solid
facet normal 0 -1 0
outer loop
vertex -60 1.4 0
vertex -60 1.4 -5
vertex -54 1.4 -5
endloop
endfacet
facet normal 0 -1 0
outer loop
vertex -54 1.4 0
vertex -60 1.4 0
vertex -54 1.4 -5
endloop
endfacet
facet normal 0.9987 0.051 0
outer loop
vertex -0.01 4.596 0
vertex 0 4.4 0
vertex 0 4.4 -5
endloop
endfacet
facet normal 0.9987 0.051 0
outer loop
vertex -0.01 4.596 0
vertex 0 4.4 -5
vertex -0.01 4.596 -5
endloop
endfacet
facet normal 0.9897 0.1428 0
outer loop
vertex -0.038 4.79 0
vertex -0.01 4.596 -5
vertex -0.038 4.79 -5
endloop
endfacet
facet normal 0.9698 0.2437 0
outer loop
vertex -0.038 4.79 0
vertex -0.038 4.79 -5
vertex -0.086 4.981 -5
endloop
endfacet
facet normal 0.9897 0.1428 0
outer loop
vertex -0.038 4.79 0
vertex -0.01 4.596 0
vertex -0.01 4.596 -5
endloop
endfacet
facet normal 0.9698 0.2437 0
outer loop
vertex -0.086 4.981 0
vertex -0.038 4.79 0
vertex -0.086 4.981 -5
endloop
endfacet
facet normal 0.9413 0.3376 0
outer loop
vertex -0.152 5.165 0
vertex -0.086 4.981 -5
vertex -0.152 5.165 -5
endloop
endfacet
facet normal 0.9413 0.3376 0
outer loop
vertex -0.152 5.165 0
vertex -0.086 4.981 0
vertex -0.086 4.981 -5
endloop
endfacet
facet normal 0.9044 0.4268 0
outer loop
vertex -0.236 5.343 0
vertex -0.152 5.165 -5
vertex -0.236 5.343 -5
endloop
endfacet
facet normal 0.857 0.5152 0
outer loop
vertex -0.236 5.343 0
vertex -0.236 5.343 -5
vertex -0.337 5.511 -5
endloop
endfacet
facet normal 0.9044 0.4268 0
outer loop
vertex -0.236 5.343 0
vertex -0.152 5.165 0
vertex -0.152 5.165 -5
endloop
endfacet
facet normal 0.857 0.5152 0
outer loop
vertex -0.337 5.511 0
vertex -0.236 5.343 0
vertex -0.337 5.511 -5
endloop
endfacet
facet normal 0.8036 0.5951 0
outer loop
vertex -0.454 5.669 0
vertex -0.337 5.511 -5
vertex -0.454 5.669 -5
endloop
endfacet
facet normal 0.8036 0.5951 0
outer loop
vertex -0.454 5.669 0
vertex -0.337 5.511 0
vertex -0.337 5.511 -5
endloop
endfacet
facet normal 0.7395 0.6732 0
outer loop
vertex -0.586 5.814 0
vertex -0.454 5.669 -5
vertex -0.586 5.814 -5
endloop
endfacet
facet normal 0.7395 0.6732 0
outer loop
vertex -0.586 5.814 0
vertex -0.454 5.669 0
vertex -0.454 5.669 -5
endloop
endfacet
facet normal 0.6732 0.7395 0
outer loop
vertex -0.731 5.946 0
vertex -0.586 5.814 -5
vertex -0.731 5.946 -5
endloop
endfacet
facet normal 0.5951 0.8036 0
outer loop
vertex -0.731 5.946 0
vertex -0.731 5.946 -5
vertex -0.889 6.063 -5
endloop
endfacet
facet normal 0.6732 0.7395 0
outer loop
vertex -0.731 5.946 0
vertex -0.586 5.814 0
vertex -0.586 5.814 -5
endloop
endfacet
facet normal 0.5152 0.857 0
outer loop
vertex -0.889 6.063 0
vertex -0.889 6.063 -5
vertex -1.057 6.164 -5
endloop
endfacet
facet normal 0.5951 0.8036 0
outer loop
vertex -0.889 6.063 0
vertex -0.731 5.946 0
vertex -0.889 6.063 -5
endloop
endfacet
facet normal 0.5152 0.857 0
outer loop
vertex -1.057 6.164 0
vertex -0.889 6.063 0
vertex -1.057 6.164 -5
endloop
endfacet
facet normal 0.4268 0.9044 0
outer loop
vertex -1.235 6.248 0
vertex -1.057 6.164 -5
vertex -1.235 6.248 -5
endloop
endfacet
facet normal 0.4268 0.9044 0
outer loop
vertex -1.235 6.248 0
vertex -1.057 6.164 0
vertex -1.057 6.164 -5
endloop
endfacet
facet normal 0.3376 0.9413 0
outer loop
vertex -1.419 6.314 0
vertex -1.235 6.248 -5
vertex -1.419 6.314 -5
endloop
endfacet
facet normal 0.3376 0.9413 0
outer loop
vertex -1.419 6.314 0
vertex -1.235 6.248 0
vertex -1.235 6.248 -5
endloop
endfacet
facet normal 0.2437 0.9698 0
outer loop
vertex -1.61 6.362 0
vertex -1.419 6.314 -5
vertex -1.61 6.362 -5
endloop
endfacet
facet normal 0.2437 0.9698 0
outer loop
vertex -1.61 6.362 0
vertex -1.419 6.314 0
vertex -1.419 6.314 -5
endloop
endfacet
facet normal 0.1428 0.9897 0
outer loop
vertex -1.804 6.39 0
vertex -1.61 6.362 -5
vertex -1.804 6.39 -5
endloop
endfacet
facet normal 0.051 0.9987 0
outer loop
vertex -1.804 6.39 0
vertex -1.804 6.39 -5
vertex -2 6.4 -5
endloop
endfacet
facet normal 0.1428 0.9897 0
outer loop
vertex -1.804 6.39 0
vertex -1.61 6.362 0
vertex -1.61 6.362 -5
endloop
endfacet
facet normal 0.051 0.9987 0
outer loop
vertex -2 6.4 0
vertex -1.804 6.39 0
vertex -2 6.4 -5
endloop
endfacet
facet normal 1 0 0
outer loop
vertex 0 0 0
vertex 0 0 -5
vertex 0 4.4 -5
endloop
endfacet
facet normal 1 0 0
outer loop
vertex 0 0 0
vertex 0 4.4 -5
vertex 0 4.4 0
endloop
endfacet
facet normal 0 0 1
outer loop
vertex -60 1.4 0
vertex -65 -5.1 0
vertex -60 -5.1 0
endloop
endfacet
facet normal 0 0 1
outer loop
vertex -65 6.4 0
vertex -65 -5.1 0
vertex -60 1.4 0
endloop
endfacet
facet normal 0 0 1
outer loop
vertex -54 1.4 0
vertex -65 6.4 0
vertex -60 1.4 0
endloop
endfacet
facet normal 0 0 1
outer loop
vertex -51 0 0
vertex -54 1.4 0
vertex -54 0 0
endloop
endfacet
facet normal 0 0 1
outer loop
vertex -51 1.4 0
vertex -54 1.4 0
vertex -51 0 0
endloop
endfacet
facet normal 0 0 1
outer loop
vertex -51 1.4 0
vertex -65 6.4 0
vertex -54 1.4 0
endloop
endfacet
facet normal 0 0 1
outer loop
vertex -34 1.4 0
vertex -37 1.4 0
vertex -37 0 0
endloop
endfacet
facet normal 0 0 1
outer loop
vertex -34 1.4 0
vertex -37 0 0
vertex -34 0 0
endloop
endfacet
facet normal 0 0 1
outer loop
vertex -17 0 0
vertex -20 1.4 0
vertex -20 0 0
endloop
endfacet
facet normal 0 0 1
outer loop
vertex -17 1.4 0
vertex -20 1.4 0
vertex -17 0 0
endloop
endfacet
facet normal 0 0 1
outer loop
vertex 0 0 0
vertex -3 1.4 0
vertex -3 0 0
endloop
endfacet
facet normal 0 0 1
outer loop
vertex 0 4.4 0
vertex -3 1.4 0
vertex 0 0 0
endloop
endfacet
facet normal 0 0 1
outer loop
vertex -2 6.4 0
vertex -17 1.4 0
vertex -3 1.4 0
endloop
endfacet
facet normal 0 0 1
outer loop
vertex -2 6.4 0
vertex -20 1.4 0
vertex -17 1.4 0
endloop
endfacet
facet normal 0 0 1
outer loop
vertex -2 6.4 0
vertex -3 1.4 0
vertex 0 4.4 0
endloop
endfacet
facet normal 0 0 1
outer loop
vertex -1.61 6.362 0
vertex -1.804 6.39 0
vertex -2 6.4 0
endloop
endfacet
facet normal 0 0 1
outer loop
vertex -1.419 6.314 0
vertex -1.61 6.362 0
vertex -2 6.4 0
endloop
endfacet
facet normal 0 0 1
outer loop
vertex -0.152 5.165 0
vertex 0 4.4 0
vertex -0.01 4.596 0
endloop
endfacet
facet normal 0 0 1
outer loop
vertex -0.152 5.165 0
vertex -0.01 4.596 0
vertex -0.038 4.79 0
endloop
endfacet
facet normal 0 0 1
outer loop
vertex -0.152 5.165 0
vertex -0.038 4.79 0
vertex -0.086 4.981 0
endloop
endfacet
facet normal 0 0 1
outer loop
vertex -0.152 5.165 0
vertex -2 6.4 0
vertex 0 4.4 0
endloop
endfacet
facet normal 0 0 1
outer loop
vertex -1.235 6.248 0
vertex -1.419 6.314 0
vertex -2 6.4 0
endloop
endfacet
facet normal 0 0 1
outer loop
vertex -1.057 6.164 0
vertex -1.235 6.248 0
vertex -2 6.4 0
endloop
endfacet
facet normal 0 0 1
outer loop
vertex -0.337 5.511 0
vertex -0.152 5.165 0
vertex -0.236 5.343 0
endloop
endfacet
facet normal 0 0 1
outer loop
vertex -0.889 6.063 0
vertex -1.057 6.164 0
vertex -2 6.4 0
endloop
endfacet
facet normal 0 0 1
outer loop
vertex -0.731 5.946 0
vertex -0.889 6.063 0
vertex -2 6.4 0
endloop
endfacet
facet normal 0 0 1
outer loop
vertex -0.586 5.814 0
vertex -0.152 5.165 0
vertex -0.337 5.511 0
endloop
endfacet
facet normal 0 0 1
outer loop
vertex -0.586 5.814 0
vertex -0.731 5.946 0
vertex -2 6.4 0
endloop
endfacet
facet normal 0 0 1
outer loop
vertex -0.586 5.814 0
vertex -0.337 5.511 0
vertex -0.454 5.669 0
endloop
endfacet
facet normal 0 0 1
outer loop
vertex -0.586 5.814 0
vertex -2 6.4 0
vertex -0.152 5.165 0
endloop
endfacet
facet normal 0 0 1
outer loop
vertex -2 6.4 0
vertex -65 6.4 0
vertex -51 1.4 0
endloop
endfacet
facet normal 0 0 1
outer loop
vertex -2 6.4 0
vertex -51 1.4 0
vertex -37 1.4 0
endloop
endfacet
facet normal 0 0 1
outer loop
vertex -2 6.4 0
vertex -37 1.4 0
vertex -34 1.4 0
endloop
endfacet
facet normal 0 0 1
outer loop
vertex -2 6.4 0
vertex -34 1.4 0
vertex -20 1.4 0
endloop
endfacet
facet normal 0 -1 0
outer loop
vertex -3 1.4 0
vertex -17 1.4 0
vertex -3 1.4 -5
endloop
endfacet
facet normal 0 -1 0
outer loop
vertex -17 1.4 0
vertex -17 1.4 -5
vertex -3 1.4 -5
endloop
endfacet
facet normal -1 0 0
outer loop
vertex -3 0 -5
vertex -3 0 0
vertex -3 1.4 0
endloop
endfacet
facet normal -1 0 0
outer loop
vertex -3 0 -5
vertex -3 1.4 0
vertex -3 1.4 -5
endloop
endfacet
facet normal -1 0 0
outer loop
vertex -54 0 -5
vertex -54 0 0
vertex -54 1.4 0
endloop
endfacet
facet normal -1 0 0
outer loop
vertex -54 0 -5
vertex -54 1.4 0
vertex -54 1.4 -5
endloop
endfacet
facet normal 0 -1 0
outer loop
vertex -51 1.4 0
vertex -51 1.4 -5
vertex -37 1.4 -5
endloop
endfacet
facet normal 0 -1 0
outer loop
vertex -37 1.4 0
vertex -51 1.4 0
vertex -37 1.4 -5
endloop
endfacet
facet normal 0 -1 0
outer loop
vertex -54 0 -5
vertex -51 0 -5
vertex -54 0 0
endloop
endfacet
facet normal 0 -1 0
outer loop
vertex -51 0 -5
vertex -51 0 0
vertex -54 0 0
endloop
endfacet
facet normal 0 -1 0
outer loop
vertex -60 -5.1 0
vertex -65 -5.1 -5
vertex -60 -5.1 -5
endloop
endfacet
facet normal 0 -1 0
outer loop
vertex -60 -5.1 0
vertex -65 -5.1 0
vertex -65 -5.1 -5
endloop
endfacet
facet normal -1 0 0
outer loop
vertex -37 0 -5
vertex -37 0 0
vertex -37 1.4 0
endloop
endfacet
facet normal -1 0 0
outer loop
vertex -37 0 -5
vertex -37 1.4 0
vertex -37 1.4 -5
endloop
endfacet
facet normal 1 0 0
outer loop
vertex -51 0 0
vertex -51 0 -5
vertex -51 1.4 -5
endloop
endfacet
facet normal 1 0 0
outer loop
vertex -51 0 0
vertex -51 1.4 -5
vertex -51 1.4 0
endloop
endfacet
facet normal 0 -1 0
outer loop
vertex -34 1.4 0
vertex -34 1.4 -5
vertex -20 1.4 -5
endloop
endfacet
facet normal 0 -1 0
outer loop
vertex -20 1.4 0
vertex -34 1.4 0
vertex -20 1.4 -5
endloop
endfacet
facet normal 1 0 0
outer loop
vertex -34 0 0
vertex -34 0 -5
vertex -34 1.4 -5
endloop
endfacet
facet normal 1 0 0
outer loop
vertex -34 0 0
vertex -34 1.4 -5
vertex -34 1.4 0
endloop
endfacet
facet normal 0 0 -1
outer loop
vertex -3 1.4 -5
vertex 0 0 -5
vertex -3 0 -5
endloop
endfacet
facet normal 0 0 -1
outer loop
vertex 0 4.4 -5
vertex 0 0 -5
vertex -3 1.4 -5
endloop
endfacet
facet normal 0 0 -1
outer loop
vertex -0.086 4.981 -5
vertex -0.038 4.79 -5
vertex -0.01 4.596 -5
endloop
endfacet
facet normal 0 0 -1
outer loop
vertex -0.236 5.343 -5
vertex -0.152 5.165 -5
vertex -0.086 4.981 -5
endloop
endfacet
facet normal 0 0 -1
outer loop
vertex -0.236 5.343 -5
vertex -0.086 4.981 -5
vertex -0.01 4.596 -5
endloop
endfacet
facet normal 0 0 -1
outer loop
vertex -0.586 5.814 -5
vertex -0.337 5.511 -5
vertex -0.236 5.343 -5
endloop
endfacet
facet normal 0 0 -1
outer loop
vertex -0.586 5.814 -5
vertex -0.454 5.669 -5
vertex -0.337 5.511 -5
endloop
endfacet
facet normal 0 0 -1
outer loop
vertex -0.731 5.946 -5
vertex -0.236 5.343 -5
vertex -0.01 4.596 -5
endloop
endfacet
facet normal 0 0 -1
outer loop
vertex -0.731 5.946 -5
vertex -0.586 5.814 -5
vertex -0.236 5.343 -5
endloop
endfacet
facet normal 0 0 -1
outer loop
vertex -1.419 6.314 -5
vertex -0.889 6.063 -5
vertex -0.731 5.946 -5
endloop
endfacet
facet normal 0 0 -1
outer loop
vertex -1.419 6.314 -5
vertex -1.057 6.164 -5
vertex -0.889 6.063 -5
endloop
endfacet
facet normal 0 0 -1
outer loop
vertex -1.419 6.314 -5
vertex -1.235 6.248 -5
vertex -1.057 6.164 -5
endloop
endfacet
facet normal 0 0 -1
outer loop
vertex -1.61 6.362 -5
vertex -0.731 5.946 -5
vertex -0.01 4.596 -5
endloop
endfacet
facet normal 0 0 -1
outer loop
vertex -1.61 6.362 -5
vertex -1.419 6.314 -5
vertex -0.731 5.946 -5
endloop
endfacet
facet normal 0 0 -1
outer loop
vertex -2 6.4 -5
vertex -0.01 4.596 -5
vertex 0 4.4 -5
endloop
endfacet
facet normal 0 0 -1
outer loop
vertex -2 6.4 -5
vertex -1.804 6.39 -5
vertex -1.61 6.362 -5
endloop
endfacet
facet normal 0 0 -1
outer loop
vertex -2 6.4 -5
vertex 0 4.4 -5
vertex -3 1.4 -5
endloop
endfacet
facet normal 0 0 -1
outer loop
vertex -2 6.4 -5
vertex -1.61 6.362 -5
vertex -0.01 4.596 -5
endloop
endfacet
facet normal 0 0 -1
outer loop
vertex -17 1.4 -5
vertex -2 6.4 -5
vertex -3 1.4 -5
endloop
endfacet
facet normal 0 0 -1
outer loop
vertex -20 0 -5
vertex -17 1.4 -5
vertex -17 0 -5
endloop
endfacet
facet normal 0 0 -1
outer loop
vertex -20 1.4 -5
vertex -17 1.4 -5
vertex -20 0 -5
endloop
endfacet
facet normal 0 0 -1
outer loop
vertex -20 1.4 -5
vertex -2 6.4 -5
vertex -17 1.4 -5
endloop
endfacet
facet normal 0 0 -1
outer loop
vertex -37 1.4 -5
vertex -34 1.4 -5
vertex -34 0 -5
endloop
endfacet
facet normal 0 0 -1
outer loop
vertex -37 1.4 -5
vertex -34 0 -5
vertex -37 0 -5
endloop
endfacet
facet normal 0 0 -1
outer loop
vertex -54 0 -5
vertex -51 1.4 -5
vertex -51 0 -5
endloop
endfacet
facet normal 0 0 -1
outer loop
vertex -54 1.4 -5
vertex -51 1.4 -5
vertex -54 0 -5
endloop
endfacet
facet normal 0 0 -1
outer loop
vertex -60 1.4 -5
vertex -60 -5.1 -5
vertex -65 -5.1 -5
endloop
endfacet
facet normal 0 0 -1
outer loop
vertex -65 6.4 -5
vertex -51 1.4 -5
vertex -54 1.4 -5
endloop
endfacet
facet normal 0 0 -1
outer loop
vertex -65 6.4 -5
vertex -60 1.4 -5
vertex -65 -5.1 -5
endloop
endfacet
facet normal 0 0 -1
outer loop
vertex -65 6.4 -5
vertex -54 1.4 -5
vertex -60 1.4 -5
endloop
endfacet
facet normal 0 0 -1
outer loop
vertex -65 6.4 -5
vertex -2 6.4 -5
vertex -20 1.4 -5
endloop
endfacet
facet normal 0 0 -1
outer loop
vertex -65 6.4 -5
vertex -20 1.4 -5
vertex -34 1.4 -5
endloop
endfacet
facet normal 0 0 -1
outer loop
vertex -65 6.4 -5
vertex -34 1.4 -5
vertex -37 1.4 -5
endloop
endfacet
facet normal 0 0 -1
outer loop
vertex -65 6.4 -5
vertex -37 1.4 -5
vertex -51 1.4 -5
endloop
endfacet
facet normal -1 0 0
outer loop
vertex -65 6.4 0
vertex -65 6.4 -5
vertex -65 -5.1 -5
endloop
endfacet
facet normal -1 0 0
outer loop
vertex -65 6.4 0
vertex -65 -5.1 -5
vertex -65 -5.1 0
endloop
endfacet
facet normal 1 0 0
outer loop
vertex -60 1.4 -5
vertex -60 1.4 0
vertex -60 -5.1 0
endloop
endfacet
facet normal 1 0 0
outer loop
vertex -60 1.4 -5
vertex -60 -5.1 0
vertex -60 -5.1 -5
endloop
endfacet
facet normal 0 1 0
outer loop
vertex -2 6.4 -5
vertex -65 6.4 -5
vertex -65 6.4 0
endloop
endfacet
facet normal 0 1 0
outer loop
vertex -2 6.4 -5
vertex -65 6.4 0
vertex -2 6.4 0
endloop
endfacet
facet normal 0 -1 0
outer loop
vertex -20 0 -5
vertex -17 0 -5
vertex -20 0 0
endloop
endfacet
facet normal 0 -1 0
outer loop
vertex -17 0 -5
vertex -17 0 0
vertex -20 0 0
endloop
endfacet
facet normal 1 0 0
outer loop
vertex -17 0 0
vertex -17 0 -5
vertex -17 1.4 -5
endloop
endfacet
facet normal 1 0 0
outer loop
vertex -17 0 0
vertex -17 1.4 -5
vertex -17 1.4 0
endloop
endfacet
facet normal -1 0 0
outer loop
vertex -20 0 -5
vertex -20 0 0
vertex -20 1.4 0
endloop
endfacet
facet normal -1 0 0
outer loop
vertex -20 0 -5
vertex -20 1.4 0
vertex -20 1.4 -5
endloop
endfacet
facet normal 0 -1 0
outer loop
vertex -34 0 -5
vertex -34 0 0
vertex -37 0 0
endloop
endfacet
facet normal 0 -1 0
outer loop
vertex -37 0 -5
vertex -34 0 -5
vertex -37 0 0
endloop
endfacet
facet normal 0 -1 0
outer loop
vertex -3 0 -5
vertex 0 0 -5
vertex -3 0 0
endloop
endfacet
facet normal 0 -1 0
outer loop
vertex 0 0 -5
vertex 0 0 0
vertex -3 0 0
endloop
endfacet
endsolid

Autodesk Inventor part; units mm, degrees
ref_plane "YZ Plane" through (0, 0, 0) normal (1, 0, 0) x (0, 1, 0)
ref_plane "XZ Plane" through (0, 0, 0) normal (0, 1, 0) x (-1, 0, 0)
ref_plane "XY Plane" through (0, 0, 0) normal (0, 0, 1) x (1, 0, 0)
sketch "Эскиз1" plane through (0, 0, 0) normal (0, 1, 0) x (-1, 0, 0)
  line L0 (0, 0) -> (3, 0)
  line L1 (3, 0) -> (3, -5)
  line L2 (3, -5) -> (0, -5)
  line L3 (0, -5) -> (0, 0)
  line L4 (17, 0) -> (20, 0)
  line L5 (20, 0) -> (20, -5)
  line L6 (20, -5) -> (17, -5)
  line L7 (17, -5) -> (17, 0)
  line L8 (34, 0) -> (37, 0)
  line L9 (37, 0) -> (37, -5)
  line L10 (37, -5) -> (34, -5)
  line L11 (34, -5) -> (34, 0)
  line L12 (51, 0) -> (54, 0)
  line L13 (54, 0) -> (54, -5)
  line L14 (54, -5) -> (51, -5)
  line L15 (51, -5) -> (51, 0)
  dimension "d0" = 3
  dimension "d1" = 5
  dimension "d3" = 3
  dimension "d4" = 5
  dimension "d6" = 3
  dimension "d7" = 5
  dimension "d9" = 3
  dimension "d10" = 5
extrude "Выдавливание1" add sketch "Эскиз1" along normal blind 1.4
sketch "Эскиз2" plane through (0, 1.4, 0) normal (0, 1, 0) x (1, 0, 0)
  line L0 (0, 0) -> (-65, 0)
  line L1 (-65, 0) -> (-65, 5)
  line L2 (-65, 5) -> (0, 5)
  line L3 (0, 5) -> (0, 0)
  line L4 (-65, 0) -> (-60, 0)
  line L5 (-60, 5) -> (-65, 5)
  line L6 (-65, 5) -> (-65, 0)
  dimension "d14" = 65
extrude "Выдавливание2" add sketch "Эскиз2" along normal blind 5
fillet "Сопряжение1" radius 2 1 edges at (0, 6.4, -2.5)
sketch "Эскиз4" plane through (0, 1.4, 0) normal (0, -1, 0) x (1, 0, 0)
  line L0 (-65, 0) -> (-2, 0) projected
  line L1 (-65, 0) -> (-60, 0)
  line L2 (-60, 0) -> (-60, -5)
  line L3 (-60, -5) -> (-65, -5)
  line L4 (-65, -5) -> (-65, 0)
  point P0 (0, 0)
  dimension "d23" = 5
  dimension "d24" = 5
extrude "Выдавливание3" add sketch "Эскиз4" along normal blind 6.5
properties part number "Bus_copper_top" material "Медь"
